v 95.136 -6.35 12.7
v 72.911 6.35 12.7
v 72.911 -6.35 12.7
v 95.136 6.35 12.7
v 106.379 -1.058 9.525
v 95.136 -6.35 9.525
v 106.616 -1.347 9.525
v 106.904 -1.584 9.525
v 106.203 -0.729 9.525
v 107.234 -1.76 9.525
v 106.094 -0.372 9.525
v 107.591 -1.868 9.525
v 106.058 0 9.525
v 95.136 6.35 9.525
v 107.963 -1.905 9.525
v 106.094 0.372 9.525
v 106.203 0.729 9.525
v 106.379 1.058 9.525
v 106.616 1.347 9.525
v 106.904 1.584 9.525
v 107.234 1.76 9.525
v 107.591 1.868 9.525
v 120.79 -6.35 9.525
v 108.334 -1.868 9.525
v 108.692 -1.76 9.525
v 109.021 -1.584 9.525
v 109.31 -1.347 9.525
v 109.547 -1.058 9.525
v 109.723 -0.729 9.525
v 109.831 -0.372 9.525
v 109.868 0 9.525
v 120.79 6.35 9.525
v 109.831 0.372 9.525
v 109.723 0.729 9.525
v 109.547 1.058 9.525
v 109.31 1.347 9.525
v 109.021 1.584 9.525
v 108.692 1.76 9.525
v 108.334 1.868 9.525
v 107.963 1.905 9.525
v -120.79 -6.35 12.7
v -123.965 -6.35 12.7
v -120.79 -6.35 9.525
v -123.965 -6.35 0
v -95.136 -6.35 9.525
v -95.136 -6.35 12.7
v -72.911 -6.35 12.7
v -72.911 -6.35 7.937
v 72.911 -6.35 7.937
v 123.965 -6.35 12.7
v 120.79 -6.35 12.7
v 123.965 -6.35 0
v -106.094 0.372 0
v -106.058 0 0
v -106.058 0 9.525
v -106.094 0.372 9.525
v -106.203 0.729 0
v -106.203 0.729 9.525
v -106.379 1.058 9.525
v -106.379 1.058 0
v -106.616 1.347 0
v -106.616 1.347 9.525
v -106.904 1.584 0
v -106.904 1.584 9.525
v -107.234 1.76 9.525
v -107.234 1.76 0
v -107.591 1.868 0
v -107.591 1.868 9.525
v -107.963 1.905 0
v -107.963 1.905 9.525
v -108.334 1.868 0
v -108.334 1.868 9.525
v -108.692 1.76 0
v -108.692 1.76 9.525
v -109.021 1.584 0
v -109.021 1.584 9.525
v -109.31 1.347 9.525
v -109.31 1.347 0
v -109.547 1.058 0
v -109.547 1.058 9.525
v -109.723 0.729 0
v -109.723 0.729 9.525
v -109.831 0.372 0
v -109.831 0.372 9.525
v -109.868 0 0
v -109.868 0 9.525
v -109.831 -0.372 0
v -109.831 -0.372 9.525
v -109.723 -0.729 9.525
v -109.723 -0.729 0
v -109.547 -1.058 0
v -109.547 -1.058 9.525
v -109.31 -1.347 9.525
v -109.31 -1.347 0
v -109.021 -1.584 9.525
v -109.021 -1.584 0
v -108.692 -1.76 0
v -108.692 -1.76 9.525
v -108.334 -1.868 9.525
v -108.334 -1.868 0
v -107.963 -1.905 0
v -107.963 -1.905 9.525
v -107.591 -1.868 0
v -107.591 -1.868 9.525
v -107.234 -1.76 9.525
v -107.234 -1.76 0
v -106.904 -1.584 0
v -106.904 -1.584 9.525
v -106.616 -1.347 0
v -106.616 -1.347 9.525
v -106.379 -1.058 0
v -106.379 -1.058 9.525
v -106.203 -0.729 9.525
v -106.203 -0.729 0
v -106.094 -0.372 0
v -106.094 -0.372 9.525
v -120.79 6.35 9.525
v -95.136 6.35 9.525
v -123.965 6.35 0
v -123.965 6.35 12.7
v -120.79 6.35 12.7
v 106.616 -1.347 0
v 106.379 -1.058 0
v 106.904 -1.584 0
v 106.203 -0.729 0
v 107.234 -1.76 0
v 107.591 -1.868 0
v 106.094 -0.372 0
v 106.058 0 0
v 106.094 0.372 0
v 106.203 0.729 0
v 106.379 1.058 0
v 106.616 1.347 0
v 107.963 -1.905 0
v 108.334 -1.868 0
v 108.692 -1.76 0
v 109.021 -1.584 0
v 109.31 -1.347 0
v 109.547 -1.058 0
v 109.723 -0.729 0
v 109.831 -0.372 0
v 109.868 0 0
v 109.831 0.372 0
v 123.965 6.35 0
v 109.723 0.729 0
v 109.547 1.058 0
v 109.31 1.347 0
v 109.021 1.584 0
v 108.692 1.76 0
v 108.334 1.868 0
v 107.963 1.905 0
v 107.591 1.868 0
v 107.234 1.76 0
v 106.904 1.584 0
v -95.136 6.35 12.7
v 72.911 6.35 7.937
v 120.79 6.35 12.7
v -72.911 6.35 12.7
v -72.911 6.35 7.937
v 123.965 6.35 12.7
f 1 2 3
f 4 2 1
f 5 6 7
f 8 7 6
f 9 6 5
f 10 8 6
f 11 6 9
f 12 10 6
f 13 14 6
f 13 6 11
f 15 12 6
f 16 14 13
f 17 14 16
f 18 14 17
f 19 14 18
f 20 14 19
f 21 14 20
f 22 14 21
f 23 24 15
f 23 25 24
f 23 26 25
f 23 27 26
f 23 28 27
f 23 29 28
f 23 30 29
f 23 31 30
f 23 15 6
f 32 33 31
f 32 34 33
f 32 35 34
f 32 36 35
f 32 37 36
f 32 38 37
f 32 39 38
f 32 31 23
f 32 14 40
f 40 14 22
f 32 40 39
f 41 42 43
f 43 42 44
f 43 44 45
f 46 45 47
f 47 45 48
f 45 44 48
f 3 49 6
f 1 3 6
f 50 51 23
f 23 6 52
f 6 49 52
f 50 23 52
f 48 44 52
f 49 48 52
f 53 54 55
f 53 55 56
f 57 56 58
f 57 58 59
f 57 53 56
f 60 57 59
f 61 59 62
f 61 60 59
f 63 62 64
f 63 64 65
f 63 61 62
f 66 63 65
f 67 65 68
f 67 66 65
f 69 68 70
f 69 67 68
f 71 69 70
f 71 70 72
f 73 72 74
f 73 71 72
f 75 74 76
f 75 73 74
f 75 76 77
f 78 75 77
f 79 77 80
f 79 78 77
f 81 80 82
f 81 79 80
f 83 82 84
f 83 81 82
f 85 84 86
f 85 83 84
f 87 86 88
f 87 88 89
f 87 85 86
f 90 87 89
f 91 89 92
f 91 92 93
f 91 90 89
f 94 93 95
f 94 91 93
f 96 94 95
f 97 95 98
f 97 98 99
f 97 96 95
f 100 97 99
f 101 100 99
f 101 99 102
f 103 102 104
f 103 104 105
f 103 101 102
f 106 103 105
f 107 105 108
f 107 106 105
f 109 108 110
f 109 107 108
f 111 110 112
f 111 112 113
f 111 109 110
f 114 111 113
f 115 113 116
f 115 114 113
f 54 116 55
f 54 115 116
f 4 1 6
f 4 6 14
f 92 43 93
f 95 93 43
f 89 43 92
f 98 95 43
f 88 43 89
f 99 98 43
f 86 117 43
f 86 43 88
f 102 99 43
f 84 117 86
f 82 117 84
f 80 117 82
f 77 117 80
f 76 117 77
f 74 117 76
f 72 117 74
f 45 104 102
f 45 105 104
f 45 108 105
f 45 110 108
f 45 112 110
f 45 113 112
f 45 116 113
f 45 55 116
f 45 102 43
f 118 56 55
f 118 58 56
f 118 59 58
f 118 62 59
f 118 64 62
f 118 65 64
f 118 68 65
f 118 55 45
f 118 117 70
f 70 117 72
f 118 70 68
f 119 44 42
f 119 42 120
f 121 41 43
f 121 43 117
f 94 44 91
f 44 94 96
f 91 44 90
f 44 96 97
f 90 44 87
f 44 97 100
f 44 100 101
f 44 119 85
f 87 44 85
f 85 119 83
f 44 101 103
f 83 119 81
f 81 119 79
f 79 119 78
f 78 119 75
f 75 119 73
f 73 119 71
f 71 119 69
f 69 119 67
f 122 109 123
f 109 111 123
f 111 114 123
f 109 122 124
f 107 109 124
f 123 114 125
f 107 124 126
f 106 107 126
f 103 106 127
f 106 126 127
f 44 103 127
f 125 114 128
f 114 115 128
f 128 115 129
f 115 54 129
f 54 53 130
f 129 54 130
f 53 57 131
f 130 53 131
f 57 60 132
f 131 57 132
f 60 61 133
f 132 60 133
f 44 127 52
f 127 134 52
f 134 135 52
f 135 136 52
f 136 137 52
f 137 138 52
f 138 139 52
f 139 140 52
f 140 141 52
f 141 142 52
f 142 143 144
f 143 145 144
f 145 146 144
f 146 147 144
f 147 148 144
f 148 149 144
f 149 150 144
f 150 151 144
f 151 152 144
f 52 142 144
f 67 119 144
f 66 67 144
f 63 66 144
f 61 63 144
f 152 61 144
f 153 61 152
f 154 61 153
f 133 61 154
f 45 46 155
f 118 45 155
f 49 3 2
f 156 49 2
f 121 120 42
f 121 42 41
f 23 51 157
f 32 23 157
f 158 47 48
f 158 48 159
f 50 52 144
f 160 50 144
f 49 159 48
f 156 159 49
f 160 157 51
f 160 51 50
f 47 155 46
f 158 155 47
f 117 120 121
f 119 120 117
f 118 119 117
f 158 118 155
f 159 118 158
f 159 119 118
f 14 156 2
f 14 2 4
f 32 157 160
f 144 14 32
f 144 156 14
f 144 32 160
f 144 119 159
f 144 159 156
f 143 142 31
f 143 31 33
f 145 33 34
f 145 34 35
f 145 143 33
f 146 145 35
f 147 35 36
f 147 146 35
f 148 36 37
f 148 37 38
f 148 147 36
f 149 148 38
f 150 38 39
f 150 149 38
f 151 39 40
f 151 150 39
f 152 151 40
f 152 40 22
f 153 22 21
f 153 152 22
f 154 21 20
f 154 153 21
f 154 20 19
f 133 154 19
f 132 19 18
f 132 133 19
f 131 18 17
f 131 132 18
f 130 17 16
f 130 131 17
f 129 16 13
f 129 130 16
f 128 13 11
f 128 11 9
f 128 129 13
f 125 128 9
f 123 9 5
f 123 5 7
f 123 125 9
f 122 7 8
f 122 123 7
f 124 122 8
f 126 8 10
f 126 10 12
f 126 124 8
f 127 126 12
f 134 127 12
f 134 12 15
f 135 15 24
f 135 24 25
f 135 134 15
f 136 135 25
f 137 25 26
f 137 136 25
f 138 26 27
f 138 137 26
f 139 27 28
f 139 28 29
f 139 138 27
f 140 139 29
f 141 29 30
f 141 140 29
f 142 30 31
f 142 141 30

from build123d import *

# Parameters (mm, degrees)
SKETCH1_W           = 247.9294
SKETCH1_H           = 12.7
BOSS_EXTRUDE1_DEPTH = 12.7
SKETCH2_W           = 25.654
SKETCH2_H           = 21.428464986
CUT_EXTRUDE1_DEPTH  = 3.175
SKETCH3_W           = 145.8214
SKETCH3_H           = 22.473236176
CUT_EXTRUDE2_DEPTH  = 4.7625
CUT_EXTRUDE3_START  = -9.525
SKETCH4_R           = 1.905
CUT_EXTRUDE3_DEPTH  = 9.525


with BuildPart() as part:
    # Sketch1 → Boss-Extrude1 (new body)
    with BuildSketch(Plane.XY):
        Rectangle(SKETCH1_W, SKETCH1_H)
    extrude(amount=BOSS_EXTRUDE1_DEPTH)

    # Sketch2 → Cut-Extrude1 (cut)
    with BuildSketch(Plane.XY.offset(12.7)):
        with Locations((-107.9627, 0)):
            Rectangle(SKETCH2_W, SKETCH2_H)
        with Locations((107.9627, 0)):
            Rectangle(SKETCH2_W, SKETCH2_H)
    extrude(amount=-CUT_EXTRUDE1_DEPTH, mode=Mode.SUBTRACT)

    # Sketch3 → Cut-Extrude2 (cut)
    with BuildSketch(Plane.XY.offset(12.7)):
        Rectangle(SKETCH3_W, SKETCH3_H)
    extrude(amount=-CUT_EXTRUDE2_DEPTH, mode=Mode.SUBTRACT)

    # Sketch4 → Cut-Extrude3 (cut)
    with BuildSketch(Plane.XY.offset(9.525).offset(CUT_EXTRUDE3_START)):
        with Locations((-107.9627, 0)):
            Circle(SKETCH4_R)
        with Locations((107.9627, 0)):
            Circle(SKETCH4_R)
    extrude(amount=CUT_EXTRUDE3_DEPTH, mode=Mode.SUBTRACT)


solid = part.part
